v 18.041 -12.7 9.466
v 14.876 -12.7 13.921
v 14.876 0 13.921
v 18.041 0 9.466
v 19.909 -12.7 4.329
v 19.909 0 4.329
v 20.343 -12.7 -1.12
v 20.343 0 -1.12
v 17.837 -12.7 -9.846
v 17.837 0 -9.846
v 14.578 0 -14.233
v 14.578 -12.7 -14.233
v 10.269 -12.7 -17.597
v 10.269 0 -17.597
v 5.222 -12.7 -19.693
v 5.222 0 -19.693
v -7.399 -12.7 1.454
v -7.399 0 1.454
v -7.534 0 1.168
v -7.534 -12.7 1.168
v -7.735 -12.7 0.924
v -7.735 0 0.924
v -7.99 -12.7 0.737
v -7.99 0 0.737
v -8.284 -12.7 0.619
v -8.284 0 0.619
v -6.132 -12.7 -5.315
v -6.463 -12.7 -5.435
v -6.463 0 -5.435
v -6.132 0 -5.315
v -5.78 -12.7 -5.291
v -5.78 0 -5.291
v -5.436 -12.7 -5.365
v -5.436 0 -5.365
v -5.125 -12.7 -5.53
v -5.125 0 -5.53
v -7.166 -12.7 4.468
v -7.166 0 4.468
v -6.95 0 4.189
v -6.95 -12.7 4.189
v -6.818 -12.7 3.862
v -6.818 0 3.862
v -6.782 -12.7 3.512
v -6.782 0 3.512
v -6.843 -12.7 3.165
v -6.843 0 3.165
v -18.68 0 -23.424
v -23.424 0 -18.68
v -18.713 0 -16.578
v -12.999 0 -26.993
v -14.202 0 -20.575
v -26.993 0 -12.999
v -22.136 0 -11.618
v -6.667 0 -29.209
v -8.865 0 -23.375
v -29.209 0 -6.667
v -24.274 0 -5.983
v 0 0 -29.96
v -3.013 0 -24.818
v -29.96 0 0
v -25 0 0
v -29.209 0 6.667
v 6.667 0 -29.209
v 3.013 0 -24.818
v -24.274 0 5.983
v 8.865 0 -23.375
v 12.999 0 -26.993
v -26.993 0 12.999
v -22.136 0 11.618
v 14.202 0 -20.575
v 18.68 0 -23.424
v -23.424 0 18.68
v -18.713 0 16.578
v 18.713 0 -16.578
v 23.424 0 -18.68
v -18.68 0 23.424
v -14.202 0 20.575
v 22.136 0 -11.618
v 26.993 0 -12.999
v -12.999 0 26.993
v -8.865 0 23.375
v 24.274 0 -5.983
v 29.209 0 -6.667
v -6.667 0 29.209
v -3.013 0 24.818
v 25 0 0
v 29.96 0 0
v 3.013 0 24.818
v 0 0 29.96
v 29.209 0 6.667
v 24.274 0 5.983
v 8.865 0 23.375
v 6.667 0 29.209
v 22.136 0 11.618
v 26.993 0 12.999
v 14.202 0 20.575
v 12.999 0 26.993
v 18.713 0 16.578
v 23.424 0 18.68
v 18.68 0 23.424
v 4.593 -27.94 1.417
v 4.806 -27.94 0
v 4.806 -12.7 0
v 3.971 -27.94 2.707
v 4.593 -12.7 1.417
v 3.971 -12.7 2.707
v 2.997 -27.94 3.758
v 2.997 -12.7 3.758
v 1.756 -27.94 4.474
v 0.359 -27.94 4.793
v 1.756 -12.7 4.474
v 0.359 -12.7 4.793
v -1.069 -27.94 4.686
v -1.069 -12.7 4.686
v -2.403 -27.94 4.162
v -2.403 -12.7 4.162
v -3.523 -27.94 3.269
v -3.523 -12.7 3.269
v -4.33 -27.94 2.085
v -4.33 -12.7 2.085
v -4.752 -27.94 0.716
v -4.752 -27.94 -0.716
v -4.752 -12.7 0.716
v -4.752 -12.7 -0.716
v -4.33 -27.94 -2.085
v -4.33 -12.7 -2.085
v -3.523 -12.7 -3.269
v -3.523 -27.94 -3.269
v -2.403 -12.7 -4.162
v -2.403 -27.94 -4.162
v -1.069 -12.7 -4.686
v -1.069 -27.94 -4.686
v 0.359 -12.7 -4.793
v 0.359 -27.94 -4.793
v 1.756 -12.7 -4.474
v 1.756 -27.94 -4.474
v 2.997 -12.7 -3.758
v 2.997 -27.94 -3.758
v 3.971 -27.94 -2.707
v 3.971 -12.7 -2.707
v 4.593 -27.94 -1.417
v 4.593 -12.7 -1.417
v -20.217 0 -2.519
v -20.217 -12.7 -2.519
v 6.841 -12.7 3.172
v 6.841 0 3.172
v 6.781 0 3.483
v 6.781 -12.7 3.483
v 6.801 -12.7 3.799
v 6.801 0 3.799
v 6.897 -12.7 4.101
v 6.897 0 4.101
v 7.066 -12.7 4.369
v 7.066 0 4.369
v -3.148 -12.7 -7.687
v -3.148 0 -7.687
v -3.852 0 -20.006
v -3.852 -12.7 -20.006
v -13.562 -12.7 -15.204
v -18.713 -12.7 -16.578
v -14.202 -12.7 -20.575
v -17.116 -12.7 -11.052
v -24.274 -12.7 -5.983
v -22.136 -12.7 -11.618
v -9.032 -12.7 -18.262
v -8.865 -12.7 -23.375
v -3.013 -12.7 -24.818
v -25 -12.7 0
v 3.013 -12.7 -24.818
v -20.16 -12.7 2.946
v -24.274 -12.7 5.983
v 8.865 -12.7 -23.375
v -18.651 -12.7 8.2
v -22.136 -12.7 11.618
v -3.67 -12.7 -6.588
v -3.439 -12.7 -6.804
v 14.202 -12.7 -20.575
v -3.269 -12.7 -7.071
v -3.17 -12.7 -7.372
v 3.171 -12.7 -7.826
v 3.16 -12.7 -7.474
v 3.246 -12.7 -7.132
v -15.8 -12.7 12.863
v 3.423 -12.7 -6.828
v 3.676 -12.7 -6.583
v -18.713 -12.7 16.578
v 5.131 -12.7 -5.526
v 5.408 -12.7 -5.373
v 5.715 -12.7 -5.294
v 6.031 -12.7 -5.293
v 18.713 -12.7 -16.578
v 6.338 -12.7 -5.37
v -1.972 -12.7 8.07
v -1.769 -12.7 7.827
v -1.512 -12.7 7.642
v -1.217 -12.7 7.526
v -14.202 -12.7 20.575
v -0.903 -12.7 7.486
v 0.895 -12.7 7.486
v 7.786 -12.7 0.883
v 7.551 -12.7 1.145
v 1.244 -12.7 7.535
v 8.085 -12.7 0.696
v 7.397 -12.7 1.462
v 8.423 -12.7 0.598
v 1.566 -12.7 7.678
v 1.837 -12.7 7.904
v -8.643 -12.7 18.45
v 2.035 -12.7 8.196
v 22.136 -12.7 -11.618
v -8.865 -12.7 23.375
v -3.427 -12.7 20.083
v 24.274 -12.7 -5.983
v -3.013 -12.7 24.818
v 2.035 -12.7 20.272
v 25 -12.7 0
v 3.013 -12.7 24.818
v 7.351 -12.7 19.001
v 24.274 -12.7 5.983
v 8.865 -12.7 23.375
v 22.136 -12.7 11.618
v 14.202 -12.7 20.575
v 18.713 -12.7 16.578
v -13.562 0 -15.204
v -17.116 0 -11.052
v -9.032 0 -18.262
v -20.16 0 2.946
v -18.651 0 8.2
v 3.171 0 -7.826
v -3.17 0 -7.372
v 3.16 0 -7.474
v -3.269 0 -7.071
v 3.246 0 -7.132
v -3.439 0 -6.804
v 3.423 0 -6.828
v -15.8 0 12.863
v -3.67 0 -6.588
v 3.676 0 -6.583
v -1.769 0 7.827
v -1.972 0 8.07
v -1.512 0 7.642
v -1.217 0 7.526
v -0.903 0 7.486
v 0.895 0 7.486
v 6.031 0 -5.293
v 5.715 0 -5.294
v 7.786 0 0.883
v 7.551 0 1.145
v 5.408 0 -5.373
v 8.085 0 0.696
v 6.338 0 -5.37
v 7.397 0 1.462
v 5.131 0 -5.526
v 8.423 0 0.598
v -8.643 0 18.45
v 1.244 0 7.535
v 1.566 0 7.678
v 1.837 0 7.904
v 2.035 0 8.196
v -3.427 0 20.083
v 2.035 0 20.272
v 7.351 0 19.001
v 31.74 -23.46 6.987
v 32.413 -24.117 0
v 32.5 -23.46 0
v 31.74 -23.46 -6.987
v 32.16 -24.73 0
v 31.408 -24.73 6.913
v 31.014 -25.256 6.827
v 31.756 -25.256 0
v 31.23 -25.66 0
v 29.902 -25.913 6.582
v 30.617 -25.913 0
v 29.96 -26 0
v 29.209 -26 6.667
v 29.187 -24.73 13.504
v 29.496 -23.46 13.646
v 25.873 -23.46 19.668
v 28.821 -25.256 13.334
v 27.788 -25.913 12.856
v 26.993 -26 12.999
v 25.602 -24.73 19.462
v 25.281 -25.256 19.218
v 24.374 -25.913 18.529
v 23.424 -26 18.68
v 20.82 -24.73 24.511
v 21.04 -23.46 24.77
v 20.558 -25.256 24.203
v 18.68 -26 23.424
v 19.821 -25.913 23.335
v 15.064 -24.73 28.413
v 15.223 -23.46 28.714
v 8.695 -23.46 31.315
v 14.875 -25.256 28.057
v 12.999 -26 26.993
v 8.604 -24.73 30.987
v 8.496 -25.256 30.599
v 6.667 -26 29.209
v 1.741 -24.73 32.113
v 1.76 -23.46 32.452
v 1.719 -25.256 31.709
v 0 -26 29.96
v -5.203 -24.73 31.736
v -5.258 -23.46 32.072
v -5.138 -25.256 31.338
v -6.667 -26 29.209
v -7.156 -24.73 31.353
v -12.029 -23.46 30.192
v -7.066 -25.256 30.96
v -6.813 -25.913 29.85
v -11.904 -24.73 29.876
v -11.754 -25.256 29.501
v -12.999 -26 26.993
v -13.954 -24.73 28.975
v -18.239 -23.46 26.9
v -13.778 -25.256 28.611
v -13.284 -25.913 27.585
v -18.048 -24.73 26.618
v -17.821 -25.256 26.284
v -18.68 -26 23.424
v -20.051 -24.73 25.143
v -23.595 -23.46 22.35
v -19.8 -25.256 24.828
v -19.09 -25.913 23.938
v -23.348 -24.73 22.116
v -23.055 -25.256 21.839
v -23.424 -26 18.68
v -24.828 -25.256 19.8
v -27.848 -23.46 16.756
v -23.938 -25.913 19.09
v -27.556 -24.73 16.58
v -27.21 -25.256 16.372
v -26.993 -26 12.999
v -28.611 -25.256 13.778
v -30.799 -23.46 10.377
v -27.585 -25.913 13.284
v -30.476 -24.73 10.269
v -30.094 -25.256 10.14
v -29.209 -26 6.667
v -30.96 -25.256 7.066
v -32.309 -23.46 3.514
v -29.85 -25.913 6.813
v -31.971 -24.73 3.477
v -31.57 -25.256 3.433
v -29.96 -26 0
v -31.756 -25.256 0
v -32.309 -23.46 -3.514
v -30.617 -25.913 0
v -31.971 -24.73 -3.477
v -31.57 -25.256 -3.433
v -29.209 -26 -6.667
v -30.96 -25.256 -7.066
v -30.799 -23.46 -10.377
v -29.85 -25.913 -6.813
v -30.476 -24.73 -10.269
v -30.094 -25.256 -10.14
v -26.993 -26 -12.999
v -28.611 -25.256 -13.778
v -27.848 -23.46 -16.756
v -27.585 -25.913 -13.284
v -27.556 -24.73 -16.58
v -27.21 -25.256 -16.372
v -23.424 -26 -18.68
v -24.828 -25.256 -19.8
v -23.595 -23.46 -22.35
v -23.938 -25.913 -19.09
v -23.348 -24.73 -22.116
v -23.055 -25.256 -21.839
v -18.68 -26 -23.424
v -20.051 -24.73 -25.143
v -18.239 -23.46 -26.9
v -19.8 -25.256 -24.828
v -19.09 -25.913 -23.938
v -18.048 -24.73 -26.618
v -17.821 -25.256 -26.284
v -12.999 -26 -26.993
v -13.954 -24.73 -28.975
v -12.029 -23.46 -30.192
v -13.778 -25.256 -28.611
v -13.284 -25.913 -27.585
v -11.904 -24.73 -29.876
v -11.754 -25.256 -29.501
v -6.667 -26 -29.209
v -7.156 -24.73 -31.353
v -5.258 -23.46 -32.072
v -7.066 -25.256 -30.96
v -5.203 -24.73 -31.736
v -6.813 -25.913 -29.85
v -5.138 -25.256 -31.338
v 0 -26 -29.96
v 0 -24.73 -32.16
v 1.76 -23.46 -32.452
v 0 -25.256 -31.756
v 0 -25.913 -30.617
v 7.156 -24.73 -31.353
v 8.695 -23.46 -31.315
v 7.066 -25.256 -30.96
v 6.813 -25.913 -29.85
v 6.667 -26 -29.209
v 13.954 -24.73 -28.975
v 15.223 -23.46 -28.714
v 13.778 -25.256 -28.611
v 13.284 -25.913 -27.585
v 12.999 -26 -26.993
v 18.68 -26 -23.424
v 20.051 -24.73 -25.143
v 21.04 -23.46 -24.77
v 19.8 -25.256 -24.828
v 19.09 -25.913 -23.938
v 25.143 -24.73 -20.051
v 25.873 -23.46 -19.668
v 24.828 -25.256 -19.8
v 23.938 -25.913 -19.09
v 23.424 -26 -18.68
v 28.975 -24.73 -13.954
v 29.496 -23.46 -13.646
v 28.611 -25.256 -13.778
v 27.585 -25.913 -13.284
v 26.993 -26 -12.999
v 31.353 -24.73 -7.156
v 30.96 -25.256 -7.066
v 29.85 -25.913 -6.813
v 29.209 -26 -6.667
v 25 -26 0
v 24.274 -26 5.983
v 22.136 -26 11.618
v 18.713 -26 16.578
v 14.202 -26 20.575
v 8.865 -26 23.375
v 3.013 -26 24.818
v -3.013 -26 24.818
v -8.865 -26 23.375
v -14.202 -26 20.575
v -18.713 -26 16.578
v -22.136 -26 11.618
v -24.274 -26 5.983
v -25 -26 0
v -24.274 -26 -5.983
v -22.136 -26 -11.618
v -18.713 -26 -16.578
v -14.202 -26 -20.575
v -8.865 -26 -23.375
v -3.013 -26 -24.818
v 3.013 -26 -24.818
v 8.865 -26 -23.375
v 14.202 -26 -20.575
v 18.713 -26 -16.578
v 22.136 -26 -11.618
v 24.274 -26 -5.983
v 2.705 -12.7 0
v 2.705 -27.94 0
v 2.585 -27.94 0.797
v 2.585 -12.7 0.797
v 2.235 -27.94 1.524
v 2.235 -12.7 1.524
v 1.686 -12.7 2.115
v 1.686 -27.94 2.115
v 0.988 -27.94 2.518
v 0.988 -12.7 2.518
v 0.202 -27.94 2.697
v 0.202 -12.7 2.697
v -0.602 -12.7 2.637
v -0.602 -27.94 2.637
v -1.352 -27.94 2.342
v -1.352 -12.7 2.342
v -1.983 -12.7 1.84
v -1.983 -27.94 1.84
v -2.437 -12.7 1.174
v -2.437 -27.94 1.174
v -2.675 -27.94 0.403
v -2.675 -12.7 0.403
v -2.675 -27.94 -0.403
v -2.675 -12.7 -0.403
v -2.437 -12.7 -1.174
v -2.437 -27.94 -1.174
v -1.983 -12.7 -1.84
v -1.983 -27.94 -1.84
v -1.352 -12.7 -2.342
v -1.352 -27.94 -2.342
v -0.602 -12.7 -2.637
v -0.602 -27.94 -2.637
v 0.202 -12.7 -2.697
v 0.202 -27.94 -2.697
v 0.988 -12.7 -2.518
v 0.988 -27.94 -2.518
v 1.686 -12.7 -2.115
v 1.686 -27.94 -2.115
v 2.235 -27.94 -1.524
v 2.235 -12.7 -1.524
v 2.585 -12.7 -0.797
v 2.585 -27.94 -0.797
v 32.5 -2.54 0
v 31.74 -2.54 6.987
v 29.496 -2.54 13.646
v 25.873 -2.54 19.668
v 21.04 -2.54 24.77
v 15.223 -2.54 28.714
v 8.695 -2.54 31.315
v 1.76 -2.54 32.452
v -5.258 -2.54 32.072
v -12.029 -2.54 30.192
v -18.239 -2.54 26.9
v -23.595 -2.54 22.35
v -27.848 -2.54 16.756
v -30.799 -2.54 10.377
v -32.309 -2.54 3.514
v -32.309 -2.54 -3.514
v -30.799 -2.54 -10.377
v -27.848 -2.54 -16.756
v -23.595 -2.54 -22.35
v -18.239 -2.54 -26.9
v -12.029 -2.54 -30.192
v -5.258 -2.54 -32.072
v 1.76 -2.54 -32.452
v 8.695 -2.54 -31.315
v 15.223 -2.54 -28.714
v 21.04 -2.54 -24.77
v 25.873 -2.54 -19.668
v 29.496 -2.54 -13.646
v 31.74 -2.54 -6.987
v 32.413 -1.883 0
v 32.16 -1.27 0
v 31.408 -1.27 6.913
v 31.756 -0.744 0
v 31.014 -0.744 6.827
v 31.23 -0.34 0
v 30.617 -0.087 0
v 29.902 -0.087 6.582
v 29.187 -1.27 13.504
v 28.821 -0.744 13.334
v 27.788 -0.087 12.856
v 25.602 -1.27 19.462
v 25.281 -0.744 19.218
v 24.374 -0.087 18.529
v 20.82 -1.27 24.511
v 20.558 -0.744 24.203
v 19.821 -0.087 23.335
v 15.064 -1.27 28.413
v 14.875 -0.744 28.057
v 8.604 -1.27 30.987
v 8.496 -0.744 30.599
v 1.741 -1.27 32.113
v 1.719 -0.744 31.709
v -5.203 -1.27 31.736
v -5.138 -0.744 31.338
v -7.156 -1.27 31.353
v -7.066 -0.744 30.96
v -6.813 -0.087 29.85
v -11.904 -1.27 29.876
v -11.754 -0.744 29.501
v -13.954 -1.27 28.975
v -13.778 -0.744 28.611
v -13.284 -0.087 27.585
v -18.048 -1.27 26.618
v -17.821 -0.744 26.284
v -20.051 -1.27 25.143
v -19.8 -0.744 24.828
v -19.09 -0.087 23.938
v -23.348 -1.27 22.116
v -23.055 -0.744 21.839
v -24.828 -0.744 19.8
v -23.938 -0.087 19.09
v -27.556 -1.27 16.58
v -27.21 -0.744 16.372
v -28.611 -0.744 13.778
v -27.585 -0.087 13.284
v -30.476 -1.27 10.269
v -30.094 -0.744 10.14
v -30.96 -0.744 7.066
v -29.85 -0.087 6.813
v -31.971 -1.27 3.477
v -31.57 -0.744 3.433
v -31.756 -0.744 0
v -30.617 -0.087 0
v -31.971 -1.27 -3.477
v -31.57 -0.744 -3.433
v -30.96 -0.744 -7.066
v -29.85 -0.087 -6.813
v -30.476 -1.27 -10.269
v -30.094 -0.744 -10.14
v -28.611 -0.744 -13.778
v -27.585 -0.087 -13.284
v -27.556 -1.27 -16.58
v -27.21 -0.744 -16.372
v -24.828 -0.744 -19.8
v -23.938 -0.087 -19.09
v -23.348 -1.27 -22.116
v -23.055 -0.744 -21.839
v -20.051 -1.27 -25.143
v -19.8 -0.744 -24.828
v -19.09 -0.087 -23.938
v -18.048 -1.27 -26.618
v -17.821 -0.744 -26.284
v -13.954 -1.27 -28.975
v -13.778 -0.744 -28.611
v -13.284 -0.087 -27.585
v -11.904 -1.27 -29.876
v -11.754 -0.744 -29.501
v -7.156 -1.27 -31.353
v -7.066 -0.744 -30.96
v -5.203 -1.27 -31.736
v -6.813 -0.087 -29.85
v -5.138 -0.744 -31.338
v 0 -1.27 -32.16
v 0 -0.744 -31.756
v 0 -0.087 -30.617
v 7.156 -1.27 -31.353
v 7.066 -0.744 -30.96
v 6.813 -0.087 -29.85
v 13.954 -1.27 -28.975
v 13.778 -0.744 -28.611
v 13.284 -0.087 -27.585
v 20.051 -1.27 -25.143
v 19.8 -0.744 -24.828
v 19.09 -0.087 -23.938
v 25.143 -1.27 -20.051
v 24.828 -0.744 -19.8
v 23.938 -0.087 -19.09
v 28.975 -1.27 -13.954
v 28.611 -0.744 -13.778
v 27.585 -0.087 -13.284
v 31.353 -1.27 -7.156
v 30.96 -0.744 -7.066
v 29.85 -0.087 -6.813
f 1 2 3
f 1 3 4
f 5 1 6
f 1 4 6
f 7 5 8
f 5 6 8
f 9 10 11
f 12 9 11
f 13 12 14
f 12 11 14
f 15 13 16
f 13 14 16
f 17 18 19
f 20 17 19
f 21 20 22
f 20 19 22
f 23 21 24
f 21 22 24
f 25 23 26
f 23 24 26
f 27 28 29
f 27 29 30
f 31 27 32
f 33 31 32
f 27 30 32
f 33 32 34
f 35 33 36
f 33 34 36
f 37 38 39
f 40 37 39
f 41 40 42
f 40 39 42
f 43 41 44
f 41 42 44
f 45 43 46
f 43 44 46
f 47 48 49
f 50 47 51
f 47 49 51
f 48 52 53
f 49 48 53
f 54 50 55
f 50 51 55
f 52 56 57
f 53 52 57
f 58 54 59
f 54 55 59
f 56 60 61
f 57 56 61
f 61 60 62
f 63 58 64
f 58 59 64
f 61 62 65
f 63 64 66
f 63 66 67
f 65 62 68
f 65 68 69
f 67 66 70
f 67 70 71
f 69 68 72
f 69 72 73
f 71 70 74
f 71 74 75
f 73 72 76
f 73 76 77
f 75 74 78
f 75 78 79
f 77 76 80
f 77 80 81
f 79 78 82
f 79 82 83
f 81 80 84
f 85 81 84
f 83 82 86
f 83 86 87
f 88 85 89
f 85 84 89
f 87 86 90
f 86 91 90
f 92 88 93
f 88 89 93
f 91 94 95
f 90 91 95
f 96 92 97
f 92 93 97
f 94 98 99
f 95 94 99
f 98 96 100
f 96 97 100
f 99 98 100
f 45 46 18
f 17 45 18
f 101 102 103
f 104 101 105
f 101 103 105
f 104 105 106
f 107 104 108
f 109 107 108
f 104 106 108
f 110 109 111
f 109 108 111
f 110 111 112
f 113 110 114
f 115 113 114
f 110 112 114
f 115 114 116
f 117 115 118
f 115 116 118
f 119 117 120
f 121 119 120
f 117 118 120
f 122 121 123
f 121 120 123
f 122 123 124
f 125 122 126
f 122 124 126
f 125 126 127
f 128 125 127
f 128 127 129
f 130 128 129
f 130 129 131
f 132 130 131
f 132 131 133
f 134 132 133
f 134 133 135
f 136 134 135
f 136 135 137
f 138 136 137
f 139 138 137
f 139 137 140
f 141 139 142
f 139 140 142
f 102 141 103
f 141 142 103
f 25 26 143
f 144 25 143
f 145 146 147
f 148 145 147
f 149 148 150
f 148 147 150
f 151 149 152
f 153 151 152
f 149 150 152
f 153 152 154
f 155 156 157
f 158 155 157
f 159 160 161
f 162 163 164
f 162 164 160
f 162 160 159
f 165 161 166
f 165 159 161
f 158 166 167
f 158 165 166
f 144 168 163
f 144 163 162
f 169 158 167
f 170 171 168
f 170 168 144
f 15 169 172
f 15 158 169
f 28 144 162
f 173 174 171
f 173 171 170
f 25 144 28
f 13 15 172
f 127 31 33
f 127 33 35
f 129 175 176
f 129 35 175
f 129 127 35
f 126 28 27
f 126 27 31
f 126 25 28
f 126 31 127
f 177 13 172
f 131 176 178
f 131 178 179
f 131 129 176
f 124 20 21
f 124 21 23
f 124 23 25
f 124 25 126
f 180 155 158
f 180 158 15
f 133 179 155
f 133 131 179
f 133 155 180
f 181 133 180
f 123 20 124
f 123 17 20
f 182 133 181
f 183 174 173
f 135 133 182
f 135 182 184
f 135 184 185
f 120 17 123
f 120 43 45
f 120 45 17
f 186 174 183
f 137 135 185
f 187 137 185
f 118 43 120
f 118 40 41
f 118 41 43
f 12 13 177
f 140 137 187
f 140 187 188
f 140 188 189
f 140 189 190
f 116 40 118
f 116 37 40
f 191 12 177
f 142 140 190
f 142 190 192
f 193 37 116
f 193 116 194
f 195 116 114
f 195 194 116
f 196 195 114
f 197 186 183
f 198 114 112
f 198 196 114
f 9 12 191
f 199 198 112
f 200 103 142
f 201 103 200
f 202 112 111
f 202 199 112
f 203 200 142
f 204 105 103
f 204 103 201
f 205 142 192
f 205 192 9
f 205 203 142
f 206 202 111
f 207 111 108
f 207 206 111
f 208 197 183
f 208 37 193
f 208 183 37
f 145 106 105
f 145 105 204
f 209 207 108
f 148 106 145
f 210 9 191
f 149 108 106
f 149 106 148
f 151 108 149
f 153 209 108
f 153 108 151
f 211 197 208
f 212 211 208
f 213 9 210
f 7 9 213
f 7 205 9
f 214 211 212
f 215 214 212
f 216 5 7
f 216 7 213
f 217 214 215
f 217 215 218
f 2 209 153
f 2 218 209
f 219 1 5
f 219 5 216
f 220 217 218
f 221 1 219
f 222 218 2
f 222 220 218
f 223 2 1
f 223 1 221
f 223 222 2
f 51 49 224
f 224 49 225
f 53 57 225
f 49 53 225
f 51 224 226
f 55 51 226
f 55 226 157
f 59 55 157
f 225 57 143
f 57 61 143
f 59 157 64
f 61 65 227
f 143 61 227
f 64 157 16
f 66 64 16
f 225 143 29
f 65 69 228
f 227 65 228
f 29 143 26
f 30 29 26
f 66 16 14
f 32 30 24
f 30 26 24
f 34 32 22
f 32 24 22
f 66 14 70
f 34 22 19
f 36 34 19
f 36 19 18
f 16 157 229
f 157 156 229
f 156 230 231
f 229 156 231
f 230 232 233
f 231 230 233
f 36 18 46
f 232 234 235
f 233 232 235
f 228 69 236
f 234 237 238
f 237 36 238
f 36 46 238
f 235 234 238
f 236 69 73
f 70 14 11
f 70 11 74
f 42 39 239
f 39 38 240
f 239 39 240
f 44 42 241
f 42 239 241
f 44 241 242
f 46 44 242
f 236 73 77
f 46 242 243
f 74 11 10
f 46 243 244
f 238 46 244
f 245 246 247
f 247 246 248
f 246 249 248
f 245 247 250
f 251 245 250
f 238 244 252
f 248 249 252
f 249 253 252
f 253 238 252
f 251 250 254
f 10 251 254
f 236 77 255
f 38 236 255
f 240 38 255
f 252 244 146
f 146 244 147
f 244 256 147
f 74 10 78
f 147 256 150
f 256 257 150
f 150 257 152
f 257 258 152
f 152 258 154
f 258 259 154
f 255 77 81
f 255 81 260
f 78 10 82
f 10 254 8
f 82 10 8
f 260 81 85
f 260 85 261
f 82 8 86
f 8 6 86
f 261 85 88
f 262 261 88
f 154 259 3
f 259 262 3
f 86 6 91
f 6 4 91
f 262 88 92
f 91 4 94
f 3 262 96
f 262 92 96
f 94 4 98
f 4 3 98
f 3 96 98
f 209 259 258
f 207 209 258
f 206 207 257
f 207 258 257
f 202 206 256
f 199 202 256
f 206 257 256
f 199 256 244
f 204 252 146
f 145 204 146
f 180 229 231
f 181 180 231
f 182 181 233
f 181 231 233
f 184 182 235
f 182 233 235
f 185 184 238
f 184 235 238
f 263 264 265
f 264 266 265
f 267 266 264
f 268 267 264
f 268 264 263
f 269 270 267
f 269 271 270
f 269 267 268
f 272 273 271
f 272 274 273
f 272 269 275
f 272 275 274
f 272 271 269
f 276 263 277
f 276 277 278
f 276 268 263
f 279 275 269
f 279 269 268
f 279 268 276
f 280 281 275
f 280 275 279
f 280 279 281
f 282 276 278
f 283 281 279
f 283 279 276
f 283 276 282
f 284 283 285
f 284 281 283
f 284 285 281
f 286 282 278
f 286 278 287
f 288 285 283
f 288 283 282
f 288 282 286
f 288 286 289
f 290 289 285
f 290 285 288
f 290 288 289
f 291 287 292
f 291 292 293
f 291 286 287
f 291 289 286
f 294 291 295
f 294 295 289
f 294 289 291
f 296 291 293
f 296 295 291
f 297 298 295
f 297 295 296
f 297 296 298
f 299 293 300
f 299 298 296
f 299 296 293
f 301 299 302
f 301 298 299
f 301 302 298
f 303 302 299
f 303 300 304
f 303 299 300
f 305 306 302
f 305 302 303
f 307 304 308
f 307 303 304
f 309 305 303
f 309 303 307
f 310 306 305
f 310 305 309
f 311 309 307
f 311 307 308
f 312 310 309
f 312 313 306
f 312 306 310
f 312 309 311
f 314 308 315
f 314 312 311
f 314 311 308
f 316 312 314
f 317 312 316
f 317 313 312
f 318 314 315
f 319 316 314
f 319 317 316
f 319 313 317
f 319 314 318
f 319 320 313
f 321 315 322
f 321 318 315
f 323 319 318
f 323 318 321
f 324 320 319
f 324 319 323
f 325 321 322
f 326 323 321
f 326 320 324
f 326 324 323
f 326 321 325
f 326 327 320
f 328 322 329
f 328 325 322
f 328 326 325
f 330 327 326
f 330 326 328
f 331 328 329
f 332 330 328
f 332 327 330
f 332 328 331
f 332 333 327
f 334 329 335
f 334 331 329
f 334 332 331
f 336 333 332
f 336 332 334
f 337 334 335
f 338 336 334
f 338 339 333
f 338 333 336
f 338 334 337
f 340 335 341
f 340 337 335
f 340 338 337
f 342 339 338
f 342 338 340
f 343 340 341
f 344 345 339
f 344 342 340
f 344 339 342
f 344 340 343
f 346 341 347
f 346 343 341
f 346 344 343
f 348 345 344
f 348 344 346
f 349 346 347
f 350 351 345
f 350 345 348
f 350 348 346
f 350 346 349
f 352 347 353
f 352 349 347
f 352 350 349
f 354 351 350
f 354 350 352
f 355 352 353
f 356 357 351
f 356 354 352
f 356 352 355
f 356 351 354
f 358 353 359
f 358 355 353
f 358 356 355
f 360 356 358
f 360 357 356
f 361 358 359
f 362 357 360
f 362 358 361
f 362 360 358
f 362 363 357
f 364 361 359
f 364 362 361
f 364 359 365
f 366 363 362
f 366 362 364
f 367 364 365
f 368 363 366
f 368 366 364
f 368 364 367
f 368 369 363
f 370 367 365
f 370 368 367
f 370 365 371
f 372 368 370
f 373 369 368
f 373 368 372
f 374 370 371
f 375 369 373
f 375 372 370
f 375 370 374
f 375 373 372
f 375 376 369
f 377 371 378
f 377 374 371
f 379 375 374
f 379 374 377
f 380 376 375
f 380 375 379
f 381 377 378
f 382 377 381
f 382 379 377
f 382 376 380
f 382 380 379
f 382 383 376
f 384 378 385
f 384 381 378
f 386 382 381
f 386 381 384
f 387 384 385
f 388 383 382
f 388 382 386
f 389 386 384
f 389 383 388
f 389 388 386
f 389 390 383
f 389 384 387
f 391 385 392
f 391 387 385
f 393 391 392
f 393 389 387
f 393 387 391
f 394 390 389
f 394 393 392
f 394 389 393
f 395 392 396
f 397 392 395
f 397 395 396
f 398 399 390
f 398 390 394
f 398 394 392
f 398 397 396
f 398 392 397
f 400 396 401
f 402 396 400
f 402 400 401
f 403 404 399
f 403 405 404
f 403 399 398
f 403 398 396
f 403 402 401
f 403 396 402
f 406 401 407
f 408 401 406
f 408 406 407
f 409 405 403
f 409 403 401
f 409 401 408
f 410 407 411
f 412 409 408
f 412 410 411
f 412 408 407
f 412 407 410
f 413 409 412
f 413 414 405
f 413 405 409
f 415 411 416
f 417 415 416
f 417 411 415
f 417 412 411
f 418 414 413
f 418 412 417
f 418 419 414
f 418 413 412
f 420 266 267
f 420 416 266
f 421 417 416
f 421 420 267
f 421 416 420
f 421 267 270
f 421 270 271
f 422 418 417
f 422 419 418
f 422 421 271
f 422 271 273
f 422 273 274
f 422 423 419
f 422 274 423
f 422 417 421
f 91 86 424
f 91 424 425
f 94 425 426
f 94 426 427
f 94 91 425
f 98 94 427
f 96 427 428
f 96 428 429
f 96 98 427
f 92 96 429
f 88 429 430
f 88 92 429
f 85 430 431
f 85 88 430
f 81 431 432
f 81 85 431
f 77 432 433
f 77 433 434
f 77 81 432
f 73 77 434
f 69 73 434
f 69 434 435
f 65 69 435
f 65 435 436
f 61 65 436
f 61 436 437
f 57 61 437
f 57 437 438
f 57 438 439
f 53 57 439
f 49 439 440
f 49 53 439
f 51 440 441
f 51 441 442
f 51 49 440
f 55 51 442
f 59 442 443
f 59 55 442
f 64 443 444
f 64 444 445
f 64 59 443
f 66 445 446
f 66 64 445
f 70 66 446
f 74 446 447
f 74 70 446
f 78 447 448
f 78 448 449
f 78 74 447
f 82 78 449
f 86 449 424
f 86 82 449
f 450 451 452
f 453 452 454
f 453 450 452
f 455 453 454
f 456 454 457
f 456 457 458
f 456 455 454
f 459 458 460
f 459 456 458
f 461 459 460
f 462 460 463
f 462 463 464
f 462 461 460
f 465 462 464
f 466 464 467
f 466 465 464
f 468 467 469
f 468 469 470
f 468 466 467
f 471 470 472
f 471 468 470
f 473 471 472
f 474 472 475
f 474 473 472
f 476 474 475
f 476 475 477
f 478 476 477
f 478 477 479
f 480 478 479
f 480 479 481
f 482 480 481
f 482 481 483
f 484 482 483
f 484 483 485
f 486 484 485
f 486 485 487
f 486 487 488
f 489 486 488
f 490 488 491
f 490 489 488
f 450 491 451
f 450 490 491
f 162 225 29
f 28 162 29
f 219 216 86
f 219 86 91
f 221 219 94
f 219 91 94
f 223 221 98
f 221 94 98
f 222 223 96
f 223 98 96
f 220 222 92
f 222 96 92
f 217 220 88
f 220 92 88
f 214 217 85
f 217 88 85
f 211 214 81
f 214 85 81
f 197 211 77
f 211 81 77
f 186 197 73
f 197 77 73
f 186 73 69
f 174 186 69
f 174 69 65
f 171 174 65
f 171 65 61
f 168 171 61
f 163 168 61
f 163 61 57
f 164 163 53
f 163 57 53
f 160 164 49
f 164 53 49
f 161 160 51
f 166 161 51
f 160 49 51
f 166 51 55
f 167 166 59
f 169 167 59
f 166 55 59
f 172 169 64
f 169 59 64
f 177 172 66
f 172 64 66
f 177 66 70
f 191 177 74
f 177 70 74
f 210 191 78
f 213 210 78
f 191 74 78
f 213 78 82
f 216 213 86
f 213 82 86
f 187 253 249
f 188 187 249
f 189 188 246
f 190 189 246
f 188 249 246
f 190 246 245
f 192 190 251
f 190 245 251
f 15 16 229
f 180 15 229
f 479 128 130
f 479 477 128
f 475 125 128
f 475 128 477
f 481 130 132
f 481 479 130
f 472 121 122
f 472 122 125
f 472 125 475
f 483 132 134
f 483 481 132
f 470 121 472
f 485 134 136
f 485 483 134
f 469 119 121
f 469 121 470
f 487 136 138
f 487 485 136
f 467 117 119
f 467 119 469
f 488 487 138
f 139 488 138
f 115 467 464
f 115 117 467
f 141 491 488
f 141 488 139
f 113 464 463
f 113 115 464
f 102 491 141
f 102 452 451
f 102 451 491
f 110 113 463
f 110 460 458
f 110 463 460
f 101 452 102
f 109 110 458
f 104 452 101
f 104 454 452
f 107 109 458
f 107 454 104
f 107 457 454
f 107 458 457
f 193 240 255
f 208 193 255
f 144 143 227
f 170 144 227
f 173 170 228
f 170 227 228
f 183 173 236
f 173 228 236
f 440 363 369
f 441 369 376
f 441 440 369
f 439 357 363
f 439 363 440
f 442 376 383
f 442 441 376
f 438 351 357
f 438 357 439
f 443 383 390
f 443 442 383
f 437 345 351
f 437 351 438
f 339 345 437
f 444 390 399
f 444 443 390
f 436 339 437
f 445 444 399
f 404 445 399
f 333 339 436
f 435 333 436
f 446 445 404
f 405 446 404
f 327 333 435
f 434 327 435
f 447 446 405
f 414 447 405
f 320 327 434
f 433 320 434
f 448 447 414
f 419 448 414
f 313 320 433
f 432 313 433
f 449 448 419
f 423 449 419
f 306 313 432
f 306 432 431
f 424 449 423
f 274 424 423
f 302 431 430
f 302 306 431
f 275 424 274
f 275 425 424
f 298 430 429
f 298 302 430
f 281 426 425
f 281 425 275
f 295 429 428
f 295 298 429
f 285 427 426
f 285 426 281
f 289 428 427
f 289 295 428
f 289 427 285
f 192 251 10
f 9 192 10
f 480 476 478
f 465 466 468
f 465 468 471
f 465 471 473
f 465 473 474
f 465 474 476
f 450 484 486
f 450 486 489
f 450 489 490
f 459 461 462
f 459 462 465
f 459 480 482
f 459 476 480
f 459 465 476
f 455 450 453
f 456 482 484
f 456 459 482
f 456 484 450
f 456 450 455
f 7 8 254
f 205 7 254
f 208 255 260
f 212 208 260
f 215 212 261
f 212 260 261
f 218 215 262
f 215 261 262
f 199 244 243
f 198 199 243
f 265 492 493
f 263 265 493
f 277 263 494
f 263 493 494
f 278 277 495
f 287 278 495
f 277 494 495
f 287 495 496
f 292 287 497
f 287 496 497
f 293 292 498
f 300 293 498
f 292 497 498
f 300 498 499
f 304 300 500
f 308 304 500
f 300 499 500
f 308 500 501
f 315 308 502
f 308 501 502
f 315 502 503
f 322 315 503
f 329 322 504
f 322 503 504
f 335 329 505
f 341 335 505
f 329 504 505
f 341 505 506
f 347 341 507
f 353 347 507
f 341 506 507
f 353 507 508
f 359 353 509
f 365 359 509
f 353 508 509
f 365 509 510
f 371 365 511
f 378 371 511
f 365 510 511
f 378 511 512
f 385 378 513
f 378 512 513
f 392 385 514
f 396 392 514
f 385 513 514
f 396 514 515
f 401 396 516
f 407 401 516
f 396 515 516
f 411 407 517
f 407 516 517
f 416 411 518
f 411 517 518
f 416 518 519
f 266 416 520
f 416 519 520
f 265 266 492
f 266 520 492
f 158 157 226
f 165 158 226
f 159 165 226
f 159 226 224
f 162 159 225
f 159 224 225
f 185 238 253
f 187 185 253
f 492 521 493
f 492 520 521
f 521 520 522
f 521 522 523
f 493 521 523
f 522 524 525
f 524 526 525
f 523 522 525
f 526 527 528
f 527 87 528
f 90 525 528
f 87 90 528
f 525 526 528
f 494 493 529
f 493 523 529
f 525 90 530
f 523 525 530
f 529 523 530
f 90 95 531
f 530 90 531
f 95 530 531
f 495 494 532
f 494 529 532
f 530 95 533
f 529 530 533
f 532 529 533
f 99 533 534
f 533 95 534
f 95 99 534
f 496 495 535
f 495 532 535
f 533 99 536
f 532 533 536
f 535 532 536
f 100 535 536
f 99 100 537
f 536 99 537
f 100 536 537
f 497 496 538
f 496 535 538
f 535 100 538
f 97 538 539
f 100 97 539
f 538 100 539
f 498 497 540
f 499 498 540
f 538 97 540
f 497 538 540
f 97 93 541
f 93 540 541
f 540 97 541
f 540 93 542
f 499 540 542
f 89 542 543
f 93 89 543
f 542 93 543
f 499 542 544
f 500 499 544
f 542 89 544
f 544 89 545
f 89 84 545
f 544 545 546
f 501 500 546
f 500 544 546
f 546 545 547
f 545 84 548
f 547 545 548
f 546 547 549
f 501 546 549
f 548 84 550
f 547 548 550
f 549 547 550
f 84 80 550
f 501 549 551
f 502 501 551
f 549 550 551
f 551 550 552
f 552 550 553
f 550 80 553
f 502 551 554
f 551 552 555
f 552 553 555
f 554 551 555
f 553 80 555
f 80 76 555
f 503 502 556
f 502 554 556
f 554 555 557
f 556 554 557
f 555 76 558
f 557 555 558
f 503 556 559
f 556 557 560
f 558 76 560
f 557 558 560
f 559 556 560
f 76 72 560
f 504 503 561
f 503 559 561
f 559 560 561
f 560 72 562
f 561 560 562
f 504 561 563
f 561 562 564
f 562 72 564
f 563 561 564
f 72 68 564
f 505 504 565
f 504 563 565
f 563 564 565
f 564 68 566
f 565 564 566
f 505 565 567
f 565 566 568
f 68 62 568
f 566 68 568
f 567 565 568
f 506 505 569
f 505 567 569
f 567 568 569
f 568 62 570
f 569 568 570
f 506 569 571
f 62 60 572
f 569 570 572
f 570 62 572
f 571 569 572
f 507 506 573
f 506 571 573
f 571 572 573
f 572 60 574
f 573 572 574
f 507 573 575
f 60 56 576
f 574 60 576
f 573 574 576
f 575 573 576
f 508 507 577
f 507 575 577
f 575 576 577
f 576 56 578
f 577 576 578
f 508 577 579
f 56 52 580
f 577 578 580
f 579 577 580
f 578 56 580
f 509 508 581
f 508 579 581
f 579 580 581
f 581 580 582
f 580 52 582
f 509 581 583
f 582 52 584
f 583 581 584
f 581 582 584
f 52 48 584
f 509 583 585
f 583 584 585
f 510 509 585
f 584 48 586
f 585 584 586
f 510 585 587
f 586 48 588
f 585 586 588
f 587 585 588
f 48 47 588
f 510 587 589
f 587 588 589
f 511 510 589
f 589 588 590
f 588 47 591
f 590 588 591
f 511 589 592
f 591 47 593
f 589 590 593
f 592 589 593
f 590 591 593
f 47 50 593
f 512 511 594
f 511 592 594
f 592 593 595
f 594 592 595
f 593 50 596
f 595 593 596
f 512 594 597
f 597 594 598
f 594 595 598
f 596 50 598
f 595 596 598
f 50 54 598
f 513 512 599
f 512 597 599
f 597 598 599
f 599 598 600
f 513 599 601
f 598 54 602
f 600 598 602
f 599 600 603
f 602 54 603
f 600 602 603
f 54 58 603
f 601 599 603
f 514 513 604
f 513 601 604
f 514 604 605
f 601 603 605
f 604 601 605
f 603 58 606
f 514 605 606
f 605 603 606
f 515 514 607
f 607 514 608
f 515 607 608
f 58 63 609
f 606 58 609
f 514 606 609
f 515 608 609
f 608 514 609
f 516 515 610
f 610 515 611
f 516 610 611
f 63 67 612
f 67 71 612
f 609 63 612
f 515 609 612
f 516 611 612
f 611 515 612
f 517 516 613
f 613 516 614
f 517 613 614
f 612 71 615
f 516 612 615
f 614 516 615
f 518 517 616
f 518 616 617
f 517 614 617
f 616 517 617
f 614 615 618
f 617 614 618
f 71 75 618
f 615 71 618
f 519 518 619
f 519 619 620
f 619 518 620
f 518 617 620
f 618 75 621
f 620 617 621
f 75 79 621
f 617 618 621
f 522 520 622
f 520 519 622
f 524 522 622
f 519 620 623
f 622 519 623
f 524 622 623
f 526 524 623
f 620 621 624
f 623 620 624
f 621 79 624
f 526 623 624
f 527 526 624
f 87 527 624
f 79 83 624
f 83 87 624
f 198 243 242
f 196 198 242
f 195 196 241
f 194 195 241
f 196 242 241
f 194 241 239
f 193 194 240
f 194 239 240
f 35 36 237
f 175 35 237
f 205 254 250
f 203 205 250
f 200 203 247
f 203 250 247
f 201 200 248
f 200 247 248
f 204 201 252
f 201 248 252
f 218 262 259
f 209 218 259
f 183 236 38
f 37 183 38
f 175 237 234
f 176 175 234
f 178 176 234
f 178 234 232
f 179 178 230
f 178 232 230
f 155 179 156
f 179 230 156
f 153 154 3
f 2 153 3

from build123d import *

# Parameters (mm, degrees)
F0_R     = 32.5
F0_R_2   = 25
F1_DEPTH = 26
F2_R     = 25
F3_DEPTH = 12.7
F4_R     = 4.806175
F4_R_2   = 2.704829
F5_DEPTH = 15.24
F6_R     = 2.54


with BuildPart() as f1:
    # F0 (on Front) → F1 (new body)
    with BuildSketch(Plane.XZ):
        Circle(F0_R)
        Circle(F0_R_2, mode=Mode.SUBTRACT)
    extrude(amount=F1_DEPTH)

    # F6
    f6_edges = [f1.edges().sort_by_distance(p)[0] for p in [
        (-32.5, -26, 0),
        (-32.5, 0, 0),
    ]]
    fillet(f6_edges, radius=F6_R)


with BuildPart() as f3:
    # F2 (on Front) → F3 (new body)
    with BuildSketch(Plane.XZ):
        Circle(F2_R)
        with BuildLine():
            Line((-3.148287, -7.687387), (-3.851863, -20.00639))
            ThreePointArc((-3.851863, -20.00639), (-11.399966, -16.885889), (-17.115929, -11.051581))
            Line((-17.115929, -11.051581), (-6.463452, -5.434556))
            ThreePointArc((-6.463452, -5.434556), (-5.780317, -5.291195), (-5.124603, -5.530495))
            Line((-5.124603, -5.530495), (-3.669734, -6.58752))
            ThreePointArc((-3.669734, -6.58752), (-3.268658, -7.070913), (-3.148287, -7.687387))
        make_face(mode=Mode.SUBTRACT)
        with BuildLine():
            Line((6.338265, -5.369732), (17.836916, -9.845654))
            ThreePointArc((17.836916, -9.845654), (12.536652, -16.060039), (5.221565, -19.693342))
            Line((5.221565, -19.693342), (3.171253, -7.826478))
            ThreePointArc((3.171253, -7.826478), (3.246009, -7.132478), (3.676224, -6.582804))
            Line((3.676224, -6.582804), (5.131094, -5.52578))
            ThreePointArc((5.131094, -5.52578), (5.714767, -5.293711), (6.338265, -5.369732))
        make_face(mode=Mode.SUBTRACT)
        with BuildLine():
            ThreePointArc((-20.217498, -2.518975), (-19.582218, 5.623985), (-15.799791, 12.86309))
            Line((-15.799791, 12.86309), (-7.165886, 4.467738))
            ThreePointArc((-7.165886, 4.467738), (-6.818442, 3.862339), (-6.843403, 3.16477))
            Line((-6.843403, 3.16477), (-7.399114, 1.454469))
            ThreePointArc((-7.399114, 1.454469), (-7.734909, 0.923647), (-8.284014, 0.618666))
            Line((-8.284014, 0.618666), (-20.217498, -2.518975))
        make_face(mode=Mode.SUBTRACT)
        with BuildLine():
            Line((-1.971515, 8.069744), (-8.643238, 18.449577))
            ThreePointArc((-8.643238, 18.449577), (-0.70251, 20.361703), (7.351121, 19.001408))
            Line((7.351121, 19.001408), (2.034691, 8.19577))
            ThreePointArc((2.034691, 8.19577), (1.566288, 7.678252), (0.895148, 7.486431))
            Line((0.895148, 7.486431), (-0.90317, 7.486431))
            ThreePointArc((-0.90317, 7.486431), (-1.511778, 7.641758), (-1.971515, 8.069744))
        make_face(mode=Mode.SUBTRACT)
        with BuildLine():
            Line((7.065551, 4.36871), (14.875683, 13.921441))
            ThreePointArc((14.875683, 13.921441), (19.148043, 6.960239), (20.343034, -1.119574))
            Line((20.343034, -1.119574), (8.423394, 0.597526))
            ThreePointArc((8.423394, 0.597526), (7.786461, 0.883082), (7.396635, 1.462099))
            Line((7.396635, 1.462099), (6.840924, 3.1724))
            ThreePointArc((6.840924, 3.1724), (6.800578, 3.799219), (7.065551, 4.36871))
        make_face(mode=Mode.SUBTRACT)
    extrude(amount=F3_DEPTH)

    # F4 (on face) → F5 (join)
    with BuildSketch(Plane.XZ.offset(12.7)):
        Circle(F4_R)
        Circle(F4_R_2, mode=Mode.SUBTRACT)
    extrude(amount=F5_DEPTH)


solid = Compound([f1.part, f3.part])
